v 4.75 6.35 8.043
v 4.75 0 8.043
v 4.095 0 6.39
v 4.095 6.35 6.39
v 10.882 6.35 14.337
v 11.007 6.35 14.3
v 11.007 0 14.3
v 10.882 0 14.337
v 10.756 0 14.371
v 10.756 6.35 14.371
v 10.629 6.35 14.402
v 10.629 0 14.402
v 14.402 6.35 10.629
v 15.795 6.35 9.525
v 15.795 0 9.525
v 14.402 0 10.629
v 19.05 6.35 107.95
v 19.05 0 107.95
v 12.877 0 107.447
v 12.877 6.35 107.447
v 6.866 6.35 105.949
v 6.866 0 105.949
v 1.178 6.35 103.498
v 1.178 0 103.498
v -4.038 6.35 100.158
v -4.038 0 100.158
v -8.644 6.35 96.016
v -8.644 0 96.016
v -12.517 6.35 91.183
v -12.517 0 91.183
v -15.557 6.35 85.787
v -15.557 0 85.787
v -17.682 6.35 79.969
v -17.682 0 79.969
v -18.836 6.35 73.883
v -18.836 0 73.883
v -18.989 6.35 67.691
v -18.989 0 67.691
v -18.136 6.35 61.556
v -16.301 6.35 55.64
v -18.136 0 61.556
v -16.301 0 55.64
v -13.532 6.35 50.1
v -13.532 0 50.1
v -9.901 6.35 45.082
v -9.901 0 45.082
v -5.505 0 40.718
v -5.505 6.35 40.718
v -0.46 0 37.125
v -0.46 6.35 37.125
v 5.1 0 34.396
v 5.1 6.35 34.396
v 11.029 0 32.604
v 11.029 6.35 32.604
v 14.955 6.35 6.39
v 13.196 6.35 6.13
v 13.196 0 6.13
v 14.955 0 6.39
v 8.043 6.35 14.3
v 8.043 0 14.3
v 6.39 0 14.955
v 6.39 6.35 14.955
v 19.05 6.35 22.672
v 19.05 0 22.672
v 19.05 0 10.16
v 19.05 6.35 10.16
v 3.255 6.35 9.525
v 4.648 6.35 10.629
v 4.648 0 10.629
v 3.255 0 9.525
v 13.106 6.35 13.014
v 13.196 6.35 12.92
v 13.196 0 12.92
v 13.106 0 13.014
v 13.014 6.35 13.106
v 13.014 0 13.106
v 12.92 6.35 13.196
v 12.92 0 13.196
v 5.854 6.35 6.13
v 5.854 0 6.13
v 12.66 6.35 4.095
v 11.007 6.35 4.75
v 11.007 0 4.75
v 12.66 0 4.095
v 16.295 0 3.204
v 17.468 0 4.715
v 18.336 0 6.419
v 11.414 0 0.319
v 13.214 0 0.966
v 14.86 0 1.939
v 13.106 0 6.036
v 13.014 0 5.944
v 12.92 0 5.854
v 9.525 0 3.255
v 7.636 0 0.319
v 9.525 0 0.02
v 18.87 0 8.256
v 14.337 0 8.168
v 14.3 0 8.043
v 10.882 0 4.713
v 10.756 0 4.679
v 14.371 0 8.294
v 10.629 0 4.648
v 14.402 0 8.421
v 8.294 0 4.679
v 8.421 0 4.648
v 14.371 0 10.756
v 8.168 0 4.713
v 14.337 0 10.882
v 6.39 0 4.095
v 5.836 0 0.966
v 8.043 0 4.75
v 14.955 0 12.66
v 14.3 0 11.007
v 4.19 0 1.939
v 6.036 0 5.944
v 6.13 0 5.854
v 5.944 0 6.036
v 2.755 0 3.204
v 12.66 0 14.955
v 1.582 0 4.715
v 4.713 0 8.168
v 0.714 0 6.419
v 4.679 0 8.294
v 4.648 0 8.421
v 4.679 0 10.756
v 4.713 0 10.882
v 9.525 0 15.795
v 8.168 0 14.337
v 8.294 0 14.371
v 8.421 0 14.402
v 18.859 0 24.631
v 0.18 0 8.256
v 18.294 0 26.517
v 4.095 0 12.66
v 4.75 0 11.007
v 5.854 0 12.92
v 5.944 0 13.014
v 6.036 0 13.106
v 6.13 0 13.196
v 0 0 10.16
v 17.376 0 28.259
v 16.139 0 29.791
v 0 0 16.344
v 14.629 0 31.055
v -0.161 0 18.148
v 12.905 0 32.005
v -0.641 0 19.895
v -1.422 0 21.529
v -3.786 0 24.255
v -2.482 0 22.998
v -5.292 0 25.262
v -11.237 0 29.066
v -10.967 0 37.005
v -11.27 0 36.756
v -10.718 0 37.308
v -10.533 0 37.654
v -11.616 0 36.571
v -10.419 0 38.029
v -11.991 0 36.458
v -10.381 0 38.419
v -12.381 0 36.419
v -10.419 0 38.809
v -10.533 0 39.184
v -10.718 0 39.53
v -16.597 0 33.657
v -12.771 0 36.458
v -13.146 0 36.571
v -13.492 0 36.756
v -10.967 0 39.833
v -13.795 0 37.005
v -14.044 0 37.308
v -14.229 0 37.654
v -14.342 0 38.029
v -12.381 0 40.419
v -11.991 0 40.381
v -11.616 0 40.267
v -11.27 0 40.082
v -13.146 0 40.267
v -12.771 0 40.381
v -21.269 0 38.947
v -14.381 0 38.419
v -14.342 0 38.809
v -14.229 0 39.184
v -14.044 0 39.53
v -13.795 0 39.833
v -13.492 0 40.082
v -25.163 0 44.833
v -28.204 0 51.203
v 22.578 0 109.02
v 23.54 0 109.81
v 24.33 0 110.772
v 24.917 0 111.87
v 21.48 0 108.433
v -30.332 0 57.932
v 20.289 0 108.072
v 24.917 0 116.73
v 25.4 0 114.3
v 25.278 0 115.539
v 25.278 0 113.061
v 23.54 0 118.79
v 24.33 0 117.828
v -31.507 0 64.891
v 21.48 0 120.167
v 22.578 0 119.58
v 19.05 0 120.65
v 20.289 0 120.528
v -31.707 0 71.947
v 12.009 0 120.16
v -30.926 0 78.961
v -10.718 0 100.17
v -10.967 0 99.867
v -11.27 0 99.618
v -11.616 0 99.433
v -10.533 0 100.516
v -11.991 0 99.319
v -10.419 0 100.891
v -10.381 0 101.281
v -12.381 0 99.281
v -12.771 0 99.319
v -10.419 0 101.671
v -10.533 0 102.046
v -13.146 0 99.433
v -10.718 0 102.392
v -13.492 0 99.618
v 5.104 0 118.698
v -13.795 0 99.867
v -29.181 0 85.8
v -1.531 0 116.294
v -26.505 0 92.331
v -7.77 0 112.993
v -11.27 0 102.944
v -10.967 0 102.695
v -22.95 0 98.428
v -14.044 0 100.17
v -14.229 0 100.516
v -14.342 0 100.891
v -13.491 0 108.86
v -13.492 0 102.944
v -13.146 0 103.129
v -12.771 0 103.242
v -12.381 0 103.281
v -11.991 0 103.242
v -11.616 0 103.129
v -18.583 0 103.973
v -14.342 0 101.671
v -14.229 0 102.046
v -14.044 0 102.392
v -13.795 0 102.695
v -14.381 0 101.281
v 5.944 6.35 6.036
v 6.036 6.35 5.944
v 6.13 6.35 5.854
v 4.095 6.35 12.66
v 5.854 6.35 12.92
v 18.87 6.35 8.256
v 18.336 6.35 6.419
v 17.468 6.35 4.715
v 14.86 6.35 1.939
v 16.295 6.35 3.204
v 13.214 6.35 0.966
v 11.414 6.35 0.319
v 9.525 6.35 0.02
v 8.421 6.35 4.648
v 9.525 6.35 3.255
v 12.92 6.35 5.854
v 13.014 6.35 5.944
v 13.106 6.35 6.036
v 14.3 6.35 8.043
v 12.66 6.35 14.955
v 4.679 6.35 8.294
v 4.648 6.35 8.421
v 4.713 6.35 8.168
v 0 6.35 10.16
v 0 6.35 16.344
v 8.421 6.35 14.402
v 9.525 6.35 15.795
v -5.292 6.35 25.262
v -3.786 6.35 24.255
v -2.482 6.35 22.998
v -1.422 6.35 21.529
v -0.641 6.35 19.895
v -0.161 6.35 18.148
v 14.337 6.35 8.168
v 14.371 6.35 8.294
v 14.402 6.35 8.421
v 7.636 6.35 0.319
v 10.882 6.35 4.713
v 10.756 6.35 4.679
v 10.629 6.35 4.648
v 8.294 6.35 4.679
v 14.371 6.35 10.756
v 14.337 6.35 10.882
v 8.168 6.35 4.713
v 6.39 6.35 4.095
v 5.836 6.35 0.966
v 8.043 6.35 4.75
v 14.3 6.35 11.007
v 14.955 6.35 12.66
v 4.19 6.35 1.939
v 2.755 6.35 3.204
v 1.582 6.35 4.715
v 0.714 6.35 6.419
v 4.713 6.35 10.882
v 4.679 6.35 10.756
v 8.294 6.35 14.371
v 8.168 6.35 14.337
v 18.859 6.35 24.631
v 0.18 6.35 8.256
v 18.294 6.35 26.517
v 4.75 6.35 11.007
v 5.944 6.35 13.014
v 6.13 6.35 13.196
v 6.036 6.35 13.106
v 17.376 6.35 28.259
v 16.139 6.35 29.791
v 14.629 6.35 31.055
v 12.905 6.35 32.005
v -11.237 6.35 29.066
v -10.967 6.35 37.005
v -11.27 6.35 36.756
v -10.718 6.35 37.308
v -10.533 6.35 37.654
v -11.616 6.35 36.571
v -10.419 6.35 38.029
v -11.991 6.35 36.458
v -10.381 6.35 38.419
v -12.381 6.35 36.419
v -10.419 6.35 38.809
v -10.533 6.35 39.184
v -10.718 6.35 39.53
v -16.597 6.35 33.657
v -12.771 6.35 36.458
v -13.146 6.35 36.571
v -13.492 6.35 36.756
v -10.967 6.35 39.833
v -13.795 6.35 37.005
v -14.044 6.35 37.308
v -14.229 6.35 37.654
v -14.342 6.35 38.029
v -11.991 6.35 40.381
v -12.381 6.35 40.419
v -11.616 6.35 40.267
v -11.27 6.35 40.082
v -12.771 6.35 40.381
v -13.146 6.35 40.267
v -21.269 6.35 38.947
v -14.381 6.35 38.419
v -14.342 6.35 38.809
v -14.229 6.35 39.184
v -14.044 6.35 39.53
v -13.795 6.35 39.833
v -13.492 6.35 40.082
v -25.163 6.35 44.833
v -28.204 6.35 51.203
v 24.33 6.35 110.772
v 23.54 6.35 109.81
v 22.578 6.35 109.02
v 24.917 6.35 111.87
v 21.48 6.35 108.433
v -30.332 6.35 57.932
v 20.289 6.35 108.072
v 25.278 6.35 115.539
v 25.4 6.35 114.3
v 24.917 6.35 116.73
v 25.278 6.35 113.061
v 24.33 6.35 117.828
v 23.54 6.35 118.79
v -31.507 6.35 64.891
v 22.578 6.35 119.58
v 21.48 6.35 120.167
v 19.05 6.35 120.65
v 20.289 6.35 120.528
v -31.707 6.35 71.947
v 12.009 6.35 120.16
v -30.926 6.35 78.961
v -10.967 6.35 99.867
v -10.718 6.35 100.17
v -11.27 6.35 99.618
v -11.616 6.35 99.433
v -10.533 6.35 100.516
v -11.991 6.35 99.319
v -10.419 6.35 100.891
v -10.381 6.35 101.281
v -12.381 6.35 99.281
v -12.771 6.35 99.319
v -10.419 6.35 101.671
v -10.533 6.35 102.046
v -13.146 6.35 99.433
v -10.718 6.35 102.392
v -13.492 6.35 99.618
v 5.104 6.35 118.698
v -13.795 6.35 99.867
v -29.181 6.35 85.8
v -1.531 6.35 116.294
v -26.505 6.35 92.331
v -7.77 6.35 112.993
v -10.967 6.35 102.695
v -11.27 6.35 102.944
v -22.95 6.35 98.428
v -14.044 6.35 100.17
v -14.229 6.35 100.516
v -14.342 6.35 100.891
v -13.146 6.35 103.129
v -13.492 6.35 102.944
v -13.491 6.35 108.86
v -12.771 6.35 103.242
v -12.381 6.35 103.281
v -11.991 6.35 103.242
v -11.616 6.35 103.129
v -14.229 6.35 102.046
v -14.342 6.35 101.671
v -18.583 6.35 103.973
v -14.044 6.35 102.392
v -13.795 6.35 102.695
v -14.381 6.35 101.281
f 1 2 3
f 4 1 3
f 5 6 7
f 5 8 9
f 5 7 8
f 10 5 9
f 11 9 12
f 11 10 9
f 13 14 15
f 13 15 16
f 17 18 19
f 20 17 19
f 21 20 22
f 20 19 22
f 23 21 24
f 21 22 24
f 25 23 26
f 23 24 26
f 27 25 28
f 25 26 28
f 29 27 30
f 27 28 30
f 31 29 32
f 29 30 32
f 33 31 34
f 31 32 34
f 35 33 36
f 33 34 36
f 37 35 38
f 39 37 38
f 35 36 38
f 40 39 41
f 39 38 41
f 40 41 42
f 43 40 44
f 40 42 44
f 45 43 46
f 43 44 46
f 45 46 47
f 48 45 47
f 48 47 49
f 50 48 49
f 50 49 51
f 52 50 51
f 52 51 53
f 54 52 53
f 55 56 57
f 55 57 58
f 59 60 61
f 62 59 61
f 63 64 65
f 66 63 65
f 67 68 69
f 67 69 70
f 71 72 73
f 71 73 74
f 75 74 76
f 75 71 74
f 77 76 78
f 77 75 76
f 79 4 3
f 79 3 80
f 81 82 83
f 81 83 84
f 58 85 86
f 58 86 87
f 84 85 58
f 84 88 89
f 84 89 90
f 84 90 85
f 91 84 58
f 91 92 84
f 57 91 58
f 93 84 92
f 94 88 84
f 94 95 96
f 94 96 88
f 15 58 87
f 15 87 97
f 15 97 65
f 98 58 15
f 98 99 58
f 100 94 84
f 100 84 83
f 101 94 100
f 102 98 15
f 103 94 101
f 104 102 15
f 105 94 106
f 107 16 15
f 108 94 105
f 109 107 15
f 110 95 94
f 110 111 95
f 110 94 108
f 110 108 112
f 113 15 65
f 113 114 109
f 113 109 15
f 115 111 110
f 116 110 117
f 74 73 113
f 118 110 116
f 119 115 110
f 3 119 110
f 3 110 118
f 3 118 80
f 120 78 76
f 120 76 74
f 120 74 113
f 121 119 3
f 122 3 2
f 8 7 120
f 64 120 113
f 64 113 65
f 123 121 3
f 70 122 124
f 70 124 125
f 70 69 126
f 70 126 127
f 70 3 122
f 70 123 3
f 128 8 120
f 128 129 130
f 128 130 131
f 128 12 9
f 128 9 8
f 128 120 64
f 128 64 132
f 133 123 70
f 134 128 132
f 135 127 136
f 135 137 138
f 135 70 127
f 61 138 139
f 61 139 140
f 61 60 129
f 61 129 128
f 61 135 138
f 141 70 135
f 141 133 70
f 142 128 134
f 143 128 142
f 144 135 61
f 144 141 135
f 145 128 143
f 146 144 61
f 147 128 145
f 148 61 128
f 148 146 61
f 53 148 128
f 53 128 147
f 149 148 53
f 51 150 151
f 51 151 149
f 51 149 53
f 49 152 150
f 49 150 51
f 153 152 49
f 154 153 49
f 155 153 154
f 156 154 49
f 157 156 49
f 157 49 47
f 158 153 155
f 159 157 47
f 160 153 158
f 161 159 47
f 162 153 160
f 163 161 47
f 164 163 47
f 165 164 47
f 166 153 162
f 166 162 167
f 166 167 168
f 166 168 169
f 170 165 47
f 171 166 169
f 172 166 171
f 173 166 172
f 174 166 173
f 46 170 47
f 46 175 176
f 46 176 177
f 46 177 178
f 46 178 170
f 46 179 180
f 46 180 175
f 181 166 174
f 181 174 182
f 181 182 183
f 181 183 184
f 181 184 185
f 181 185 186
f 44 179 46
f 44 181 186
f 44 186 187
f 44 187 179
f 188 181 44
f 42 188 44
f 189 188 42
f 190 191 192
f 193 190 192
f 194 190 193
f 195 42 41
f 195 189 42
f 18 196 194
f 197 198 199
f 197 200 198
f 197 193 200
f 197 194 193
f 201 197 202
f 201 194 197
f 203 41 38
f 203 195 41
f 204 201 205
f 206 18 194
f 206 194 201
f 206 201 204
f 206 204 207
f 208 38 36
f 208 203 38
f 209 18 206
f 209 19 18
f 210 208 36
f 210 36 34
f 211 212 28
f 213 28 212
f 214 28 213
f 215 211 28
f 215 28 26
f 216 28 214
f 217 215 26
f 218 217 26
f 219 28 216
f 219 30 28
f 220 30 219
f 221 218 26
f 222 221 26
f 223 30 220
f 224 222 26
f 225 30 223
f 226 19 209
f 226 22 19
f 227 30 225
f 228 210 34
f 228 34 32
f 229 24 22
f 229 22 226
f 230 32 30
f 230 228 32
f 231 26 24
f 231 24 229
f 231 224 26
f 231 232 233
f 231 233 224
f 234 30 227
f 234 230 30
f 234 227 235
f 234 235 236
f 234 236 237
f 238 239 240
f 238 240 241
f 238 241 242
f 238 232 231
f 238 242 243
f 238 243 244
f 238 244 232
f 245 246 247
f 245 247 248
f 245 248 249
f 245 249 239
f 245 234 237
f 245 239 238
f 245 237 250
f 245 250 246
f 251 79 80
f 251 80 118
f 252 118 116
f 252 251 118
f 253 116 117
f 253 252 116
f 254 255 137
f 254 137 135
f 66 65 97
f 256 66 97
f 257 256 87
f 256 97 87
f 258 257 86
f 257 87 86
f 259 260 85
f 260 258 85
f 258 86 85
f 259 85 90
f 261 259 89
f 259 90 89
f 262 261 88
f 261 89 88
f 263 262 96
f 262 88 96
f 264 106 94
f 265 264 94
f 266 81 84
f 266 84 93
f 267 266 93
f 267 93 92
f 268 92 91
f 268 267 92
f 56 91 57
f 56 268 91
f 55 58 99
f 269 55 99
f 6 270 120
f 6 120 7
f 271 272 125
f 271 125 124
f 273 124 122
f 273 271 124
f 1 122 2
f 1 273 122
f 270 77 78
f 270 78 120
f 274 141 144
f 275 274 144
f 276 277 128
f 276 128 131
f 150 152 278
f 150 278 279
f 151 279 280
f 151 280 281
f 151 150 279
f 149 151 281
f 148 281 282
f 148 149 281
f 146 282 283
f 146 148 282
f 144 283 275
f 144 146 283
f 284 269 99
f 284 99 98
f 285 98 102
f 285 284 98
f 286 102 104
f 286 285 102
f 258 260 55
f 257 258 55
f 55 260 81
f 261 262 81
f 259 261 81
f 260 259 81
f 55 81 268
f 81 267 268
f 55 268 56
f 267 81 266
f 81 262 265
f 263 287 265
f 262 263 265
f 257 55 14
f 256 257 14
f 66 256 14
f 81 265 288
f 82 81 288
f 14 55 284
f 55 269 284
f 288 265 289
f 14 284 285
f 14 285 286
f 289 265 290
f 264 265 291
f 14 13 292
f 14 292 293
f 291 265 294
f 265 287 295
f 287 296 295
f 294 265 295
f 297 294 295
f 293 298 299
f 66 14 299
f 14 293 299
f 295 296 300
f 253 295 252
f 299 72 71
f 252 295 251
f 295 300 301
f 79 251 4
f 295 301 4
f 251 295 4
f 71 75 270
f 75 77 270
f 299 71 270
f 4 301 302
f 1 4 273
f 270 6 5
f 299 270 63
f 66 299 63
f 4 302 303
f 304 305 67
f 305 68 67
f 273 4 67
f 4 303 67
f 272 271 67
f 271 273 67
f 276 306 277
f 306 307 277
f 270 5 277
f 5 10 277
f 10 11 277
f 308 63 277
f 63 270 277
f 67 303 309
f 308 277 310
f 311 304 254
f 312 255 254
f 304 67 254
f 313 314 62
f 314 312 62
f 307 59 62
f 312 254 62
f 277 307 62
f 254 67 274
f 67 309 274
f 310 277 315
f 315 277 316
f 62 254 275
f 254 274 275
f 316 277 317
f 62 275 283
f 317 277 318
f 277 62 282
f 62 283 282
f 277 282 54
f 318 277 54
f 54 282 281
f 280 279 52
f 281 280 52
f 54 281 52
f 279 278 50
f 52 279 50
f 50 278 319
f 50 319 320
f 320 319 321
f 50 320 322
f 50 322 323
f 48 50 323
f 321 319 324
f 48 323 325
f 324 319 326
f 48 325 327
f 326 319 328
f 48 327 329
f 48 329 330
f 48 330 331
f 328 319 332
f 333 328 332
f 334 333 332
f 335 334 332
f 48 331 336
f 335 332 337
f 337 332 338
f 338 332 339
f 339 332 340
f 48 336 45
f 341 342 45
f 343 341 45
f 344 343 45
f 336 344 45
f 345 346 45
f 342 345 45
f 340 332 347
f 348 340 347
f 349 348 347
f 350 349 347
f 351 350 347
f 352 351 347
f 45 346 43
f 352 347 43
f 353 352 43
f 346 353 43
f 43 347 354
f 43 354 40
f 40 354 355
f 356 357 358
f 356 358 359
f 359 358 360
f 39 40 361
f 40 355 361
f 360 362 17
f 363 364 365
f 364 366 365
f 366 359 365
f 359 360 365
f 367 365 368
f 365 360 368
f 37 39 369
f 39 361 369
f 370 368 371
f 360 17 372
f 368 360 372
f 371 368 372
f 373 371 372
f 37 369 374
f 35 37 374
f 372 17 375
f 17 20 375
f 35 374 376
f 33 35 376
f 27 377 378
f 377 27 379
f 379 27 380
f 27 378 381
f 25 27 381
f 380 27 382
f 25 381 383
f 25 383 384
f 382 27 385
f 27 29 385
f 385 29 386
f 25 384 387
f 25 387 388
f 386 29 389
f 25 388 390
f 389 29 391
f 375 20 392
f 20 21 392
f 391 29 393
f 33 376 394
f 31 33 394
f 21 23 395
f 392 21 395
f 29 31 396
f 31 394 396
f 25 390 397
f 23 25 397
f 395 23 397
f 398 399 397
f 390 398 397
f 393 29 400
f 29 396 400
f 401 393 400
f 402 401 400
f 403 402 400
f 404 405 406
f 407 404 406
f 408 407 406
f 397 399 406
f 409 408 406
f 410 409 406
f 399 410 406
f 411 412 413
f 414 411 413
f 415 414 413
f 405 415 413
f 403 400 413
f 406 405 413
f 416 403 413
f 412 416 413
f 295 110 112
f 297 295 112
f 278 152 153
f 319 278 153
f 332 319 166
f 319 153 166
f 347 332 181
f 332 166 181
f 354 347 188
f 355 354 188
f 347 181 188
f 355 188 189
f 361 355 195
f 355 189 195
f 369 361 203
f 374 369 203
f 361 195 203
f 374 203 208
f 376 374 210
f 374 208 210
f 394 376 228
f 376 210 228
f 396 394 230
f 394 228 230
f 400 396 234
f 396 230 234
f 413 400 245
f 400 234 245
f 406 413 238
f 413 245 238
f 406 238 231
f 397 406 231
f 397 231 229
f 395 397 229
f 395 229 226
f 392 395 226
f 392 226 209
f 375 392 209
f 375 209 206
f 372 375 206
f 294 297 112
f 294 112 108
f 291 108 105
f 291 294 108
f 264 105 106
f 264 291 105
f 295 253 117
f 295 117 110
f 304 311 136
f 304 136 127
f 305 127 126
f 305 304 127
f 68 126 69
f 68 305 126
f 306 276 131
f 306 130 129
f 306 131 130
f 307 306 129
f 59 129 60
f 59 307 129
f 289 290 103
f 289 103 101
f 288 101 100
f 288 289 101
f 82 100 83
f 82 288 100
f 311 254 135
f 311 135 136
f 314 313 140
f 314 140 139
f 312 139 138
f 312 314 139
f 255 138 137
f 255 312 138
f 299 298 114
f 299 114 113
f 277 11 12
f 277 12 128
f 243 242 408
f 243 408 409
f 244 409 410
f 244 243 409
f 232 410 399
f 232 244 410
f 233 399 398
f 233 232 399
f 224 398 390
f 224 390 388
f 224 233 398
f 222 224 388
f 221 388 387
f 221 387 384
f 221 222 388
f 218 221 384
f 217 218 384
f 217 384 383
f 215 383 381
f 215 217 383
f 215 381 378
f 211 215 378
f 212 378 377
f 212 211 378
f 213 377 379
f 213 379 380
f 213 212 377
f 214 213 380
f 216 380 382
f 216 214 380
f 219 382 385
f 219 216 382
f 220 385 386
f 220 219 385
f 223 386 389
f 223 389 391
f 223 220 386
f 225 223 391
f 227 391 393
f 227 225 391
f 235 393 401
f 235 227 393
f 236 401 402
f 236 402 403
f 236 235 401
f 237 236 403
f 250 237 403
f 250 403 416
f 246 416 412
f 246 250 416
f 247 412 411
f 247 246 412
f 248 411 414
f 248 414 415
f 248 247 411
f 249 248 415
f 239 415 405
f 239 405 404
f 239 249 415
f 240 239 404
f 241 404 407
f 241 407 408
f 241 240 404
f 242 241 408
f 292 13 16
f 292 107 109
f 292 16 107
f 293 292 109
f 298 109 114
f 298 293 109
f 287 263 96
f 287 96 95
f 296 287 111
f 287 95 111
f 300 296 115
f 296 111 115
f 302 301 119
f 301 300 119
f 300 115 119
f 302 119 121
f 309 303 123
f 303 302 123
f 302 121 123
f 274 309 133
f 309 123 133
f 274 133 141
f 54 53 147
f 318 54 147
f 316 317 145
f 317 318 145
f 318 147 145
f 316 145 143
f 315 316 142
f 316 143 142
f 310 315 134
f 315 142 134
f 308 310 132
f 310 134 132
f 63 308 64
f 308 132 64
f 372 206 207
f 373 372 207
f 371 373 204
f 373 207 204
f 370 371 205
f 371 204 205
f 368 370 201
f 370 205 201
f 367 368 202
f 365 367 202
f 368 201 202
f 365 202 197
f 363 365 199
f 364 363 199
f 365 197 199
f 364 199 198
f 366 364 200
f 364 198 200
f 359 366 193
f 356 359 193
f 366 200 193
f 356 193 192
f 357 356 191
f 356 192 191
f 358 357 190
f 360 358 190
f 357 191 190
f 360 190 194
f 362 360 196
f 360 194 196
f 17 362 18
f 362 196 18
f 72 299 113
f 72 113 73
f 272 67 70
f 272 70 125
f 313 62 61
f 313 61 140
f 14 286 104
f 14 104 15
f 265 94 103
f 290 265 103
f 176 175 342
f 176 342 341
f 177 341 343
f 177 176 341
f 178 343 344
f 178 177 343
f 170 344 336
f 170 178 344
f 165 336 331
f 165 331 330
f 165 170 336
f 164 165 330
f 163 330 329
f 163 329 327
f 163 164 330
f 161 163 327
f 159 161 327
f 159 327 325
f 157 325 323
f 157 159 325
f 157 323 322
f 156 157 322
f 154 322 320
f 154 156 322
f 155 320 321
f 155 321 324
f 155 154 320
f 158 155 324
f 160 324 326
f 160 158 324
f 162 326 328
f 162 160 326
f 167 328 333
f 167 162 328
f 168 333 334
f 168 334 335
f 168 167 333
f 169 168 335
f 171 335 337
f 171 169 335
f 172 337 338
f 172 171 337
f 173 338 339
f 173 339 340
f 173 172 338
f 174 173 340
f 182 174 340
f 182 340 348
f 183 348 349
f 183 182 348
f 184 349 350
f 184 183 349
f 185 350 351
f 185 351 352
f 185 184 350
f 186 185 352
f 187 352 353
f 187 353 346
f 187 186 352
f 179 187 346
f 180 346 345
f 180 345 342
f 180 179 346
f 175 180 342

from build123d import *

# Parameters (mm, degrees)
SKETCH1_R           = 3
SKETCH1_R_2         = 2
BOSS_EXTRUDE1_DEPTH = 6.35
FILLET1_R           = 10.16
CUT_EXTRUDE1_DEPTH  = 125.919203888


with BuildPart() as part:
    # Sketch1 → Boss-Extrude1 (new body)
    with BuildSketch(Plane(origin=(0, 0, 0), x_dir=(1, 0, 0), z_dir=(0, 1, 0))):
        with BuildLine():
            Line((19.05, 0), (0, 0))
            Line((0, 0), (0, -22.757139607))
            ThreePointArc((0, -22.757139607), (-30.814603217, -79.553676933), (19.05, -120.65))
            ThreePointArc((19.05, -120.65), (25.4, -114.3), (19.05, -107.95))
            ThreePointArc((19.05, -107.95), (-19.05, -69.85), (19.05, -31.75))
            Line((19.05, -31.75), (19.05, 0))
        make_face()
        with Locations(Location((9.525, -9.525, 0), (0, 0, 270))):
            Circle(SKETCH1_R, mode=Mode.SUBTRACT)
        with Locations(Location((-12.380896424, -38.419103576, 0), (0, 0, 270))):
            Circle(SKETCH1_R_2, mode=Mode.SUBTRACT)
        with Locations(Location((-12.380896424, -101.280896424, 0), (0, 0, 270))):
            Circle(SKETCH1_R_2, mode=Mode.SUBTRACT)
    extrude(amount=BOSS_EXTRUDE1_DEPTH)

    # Fillet1
    # the kernel refuses this fillet: 10.16 mm, written as the material it adds along each edge
    with BuildSketch(Plane(origin=(0, 0, 22.757139607), x_dir=(0, 0, -1), z_dir=(0, 1, 0))) as fillet1_piece_1:
        with BuildLine():
            CenterArc((6.413190667, 10.16), FILLET1_R, 208.630989837, 61.369010163)
            ThreePointArc((-2.50448451, 5.291666667), (-1.175949507, 2.681941807), (0, 0))
            Line((0, 0), (6.413190667, 0))
        make_face()
    extrude(amount=6.35)
    # the kernel refuses this fillet: 10.16 mm, written as the material it takes off along each edge
    with BuildSketch(Plane(origin=(19.05, -22.696015193, 31.75), x_dir=(0, 0, -1), z_dir=(0, 1, 0))) as fillet1_2_piece_1:
        with BuildLine():
            CenterArc((9.078406077, 10.16), FILLET1_R, 192.153197469, 77.846802531)
            ThreePointArc((-0.853889939, 8.021052632), (-0.214073897, 4.033187739), (0, 0))
            Line((0, 0), (9.078406077, 0))
        make_face()
    extrude(amount=51.742030387, mode=Mode.SUBTRACT)
    with BuildSketch(Plane(origin=(0, -25.4, 0), x_dir=(1, 0, 0), z_dir=(0, 1, 0)), Plane(origin=(19.05, -25.4, 0), x_dir=(0, 0, 1), z_dir=(0, 1, 0))) as fillet1_2_piece_2:
        with BuildLine():
            CenterArc((FILLET1_R, -FILLET1_R), FILLET1_R, 90, 90)
            Line((0, -FILLET1_R), (0, 0))
            Line((0, 0), (FILLET1_R, 0))
        make_face()
    extrude(amount=57.15, mode=Mode.SUBTRACT)

    # Sketch2 → Cut-Extrude1 (cut, through all)
    with BuildSketch(Plane(origin=(0, 6.35, 0), x_dir=(1, 0, 0), z_dir=(0, 1, 0))):
        with BuildLine():
            Line((9.525, -3.255), (10.629314157, -4.648475598))
            ThreePointArc((10.629314157, -4.648475598), (10.819095226, -4.695370869), (11.006898087, -4.749648907))
            Line((11.006898087, -4.749648907), (12.66, -4.095020718))
            Line((12.66, -4.095020718), (12.919626315, -5.853963064))
            ThreePointArc((12.919626315, -5.853963064), (13.060533906, -5.989466094), (13.196036936, -6.130373685))
            Line((13.196036936, -6.130373685), (14.954979282, -6.39))
            Line((14.954979282, -6.39), (14.300351093, -8.043101913))
            ThreePointArc((14.300351093, -8.043101913), (14.354629131, -8.230904774), (14.401524402, -8.420685843))
            Line((14.401524402, -8.420685843), (15.795, -9.525))
            Line((15.795, -9.525), (14.401524402, -10.629314157))
            ThreePointArc((14.401524402, -10.629314157), (14.354629131, -10.819095226), (14.300351093, -11.006898087))
            Line((14.300351093, -11.006898087), (14.954979282, -12.66))
            Line((14.954979282, -12.66), (13.196036936, -12.919626315))
            ThreePointArc((13.196036936, -12.919626315), (13.060533906, -13.060533906), (12.919626315, -13.196036936))
            Line((12.919626315, -13.196036936), (12.66, -14.954979282))
            Line((12.66, -14.954979282), (11.006898087, -14.300351093))
            ThreePointArc((11.006898087, -14.300351093), (10.819095226, -14.354629131), (10.629314157, -14.401524402))
            Line((10.629314157, -14.401524402), (9.525, -15.795))
            Line((9.525, -15.795), (8.420685843, -14.401524402))
            ThreePointArc((8.420685843, -14.401524402), (8.230904774, -14.354629131), (8.043101913, -14.300351093))
            Line((8.043101913, -14.300351093), (6.39, -14.954979282))
            Line((6.39, -14.954979282), (6.130373685, -13.196036936))
            ThreePointArc((6.130373685, -13.196036936), (5.989466094, -13.060533906), (5.853963064, -12.919626315))
            Line((5.853963064, -12.919626315), (4.095020718, -12.66))
            Line((4.095020718, -12.66), (4.749648907, -11.006898087))
            ThreePointArc((4.749648907, -11.006898087), (4.695370869, -10.819095226), (4.648475598, -10.629314157))
            Line((4.648475598, -10.629314157), (3.255, -9.525))
            Line((3.255, -9.525), (4.648475598, -8.420685843))
            ThreePointArc((4.648475598, -8.420685843), (4.695370869, -8.230904774), (4.749648907, -8.043101913))
            Line((4.749648907, -8.043101913), (4.095020718, -6.39))
            Line((4.095020718, -6.39), (5.853963064, -6.130373685))
            ThreePointArc((5.853963064, -6.130373685), (5.989466094, -5.989466094), (6.130373685, -5.853963064))
            Line((6.130373685, -5.853963064), (6.39, -4.095020718))
            Line((6.39, -4.095020718), (8.043101913, -4.749648907))
            ThreePointArc((8.043101913, -4.749648907), (8.230904774, -4.695370869), (8.420685843, -4.648475598))
            Line((8.420685843, -4.648475598), (9.525, -3.255))
        make_face()
    extrude(amount=-CUT_EXTRUDE1_DEPTH, mode=Mode.SUBTRACT)


solid = part.part
